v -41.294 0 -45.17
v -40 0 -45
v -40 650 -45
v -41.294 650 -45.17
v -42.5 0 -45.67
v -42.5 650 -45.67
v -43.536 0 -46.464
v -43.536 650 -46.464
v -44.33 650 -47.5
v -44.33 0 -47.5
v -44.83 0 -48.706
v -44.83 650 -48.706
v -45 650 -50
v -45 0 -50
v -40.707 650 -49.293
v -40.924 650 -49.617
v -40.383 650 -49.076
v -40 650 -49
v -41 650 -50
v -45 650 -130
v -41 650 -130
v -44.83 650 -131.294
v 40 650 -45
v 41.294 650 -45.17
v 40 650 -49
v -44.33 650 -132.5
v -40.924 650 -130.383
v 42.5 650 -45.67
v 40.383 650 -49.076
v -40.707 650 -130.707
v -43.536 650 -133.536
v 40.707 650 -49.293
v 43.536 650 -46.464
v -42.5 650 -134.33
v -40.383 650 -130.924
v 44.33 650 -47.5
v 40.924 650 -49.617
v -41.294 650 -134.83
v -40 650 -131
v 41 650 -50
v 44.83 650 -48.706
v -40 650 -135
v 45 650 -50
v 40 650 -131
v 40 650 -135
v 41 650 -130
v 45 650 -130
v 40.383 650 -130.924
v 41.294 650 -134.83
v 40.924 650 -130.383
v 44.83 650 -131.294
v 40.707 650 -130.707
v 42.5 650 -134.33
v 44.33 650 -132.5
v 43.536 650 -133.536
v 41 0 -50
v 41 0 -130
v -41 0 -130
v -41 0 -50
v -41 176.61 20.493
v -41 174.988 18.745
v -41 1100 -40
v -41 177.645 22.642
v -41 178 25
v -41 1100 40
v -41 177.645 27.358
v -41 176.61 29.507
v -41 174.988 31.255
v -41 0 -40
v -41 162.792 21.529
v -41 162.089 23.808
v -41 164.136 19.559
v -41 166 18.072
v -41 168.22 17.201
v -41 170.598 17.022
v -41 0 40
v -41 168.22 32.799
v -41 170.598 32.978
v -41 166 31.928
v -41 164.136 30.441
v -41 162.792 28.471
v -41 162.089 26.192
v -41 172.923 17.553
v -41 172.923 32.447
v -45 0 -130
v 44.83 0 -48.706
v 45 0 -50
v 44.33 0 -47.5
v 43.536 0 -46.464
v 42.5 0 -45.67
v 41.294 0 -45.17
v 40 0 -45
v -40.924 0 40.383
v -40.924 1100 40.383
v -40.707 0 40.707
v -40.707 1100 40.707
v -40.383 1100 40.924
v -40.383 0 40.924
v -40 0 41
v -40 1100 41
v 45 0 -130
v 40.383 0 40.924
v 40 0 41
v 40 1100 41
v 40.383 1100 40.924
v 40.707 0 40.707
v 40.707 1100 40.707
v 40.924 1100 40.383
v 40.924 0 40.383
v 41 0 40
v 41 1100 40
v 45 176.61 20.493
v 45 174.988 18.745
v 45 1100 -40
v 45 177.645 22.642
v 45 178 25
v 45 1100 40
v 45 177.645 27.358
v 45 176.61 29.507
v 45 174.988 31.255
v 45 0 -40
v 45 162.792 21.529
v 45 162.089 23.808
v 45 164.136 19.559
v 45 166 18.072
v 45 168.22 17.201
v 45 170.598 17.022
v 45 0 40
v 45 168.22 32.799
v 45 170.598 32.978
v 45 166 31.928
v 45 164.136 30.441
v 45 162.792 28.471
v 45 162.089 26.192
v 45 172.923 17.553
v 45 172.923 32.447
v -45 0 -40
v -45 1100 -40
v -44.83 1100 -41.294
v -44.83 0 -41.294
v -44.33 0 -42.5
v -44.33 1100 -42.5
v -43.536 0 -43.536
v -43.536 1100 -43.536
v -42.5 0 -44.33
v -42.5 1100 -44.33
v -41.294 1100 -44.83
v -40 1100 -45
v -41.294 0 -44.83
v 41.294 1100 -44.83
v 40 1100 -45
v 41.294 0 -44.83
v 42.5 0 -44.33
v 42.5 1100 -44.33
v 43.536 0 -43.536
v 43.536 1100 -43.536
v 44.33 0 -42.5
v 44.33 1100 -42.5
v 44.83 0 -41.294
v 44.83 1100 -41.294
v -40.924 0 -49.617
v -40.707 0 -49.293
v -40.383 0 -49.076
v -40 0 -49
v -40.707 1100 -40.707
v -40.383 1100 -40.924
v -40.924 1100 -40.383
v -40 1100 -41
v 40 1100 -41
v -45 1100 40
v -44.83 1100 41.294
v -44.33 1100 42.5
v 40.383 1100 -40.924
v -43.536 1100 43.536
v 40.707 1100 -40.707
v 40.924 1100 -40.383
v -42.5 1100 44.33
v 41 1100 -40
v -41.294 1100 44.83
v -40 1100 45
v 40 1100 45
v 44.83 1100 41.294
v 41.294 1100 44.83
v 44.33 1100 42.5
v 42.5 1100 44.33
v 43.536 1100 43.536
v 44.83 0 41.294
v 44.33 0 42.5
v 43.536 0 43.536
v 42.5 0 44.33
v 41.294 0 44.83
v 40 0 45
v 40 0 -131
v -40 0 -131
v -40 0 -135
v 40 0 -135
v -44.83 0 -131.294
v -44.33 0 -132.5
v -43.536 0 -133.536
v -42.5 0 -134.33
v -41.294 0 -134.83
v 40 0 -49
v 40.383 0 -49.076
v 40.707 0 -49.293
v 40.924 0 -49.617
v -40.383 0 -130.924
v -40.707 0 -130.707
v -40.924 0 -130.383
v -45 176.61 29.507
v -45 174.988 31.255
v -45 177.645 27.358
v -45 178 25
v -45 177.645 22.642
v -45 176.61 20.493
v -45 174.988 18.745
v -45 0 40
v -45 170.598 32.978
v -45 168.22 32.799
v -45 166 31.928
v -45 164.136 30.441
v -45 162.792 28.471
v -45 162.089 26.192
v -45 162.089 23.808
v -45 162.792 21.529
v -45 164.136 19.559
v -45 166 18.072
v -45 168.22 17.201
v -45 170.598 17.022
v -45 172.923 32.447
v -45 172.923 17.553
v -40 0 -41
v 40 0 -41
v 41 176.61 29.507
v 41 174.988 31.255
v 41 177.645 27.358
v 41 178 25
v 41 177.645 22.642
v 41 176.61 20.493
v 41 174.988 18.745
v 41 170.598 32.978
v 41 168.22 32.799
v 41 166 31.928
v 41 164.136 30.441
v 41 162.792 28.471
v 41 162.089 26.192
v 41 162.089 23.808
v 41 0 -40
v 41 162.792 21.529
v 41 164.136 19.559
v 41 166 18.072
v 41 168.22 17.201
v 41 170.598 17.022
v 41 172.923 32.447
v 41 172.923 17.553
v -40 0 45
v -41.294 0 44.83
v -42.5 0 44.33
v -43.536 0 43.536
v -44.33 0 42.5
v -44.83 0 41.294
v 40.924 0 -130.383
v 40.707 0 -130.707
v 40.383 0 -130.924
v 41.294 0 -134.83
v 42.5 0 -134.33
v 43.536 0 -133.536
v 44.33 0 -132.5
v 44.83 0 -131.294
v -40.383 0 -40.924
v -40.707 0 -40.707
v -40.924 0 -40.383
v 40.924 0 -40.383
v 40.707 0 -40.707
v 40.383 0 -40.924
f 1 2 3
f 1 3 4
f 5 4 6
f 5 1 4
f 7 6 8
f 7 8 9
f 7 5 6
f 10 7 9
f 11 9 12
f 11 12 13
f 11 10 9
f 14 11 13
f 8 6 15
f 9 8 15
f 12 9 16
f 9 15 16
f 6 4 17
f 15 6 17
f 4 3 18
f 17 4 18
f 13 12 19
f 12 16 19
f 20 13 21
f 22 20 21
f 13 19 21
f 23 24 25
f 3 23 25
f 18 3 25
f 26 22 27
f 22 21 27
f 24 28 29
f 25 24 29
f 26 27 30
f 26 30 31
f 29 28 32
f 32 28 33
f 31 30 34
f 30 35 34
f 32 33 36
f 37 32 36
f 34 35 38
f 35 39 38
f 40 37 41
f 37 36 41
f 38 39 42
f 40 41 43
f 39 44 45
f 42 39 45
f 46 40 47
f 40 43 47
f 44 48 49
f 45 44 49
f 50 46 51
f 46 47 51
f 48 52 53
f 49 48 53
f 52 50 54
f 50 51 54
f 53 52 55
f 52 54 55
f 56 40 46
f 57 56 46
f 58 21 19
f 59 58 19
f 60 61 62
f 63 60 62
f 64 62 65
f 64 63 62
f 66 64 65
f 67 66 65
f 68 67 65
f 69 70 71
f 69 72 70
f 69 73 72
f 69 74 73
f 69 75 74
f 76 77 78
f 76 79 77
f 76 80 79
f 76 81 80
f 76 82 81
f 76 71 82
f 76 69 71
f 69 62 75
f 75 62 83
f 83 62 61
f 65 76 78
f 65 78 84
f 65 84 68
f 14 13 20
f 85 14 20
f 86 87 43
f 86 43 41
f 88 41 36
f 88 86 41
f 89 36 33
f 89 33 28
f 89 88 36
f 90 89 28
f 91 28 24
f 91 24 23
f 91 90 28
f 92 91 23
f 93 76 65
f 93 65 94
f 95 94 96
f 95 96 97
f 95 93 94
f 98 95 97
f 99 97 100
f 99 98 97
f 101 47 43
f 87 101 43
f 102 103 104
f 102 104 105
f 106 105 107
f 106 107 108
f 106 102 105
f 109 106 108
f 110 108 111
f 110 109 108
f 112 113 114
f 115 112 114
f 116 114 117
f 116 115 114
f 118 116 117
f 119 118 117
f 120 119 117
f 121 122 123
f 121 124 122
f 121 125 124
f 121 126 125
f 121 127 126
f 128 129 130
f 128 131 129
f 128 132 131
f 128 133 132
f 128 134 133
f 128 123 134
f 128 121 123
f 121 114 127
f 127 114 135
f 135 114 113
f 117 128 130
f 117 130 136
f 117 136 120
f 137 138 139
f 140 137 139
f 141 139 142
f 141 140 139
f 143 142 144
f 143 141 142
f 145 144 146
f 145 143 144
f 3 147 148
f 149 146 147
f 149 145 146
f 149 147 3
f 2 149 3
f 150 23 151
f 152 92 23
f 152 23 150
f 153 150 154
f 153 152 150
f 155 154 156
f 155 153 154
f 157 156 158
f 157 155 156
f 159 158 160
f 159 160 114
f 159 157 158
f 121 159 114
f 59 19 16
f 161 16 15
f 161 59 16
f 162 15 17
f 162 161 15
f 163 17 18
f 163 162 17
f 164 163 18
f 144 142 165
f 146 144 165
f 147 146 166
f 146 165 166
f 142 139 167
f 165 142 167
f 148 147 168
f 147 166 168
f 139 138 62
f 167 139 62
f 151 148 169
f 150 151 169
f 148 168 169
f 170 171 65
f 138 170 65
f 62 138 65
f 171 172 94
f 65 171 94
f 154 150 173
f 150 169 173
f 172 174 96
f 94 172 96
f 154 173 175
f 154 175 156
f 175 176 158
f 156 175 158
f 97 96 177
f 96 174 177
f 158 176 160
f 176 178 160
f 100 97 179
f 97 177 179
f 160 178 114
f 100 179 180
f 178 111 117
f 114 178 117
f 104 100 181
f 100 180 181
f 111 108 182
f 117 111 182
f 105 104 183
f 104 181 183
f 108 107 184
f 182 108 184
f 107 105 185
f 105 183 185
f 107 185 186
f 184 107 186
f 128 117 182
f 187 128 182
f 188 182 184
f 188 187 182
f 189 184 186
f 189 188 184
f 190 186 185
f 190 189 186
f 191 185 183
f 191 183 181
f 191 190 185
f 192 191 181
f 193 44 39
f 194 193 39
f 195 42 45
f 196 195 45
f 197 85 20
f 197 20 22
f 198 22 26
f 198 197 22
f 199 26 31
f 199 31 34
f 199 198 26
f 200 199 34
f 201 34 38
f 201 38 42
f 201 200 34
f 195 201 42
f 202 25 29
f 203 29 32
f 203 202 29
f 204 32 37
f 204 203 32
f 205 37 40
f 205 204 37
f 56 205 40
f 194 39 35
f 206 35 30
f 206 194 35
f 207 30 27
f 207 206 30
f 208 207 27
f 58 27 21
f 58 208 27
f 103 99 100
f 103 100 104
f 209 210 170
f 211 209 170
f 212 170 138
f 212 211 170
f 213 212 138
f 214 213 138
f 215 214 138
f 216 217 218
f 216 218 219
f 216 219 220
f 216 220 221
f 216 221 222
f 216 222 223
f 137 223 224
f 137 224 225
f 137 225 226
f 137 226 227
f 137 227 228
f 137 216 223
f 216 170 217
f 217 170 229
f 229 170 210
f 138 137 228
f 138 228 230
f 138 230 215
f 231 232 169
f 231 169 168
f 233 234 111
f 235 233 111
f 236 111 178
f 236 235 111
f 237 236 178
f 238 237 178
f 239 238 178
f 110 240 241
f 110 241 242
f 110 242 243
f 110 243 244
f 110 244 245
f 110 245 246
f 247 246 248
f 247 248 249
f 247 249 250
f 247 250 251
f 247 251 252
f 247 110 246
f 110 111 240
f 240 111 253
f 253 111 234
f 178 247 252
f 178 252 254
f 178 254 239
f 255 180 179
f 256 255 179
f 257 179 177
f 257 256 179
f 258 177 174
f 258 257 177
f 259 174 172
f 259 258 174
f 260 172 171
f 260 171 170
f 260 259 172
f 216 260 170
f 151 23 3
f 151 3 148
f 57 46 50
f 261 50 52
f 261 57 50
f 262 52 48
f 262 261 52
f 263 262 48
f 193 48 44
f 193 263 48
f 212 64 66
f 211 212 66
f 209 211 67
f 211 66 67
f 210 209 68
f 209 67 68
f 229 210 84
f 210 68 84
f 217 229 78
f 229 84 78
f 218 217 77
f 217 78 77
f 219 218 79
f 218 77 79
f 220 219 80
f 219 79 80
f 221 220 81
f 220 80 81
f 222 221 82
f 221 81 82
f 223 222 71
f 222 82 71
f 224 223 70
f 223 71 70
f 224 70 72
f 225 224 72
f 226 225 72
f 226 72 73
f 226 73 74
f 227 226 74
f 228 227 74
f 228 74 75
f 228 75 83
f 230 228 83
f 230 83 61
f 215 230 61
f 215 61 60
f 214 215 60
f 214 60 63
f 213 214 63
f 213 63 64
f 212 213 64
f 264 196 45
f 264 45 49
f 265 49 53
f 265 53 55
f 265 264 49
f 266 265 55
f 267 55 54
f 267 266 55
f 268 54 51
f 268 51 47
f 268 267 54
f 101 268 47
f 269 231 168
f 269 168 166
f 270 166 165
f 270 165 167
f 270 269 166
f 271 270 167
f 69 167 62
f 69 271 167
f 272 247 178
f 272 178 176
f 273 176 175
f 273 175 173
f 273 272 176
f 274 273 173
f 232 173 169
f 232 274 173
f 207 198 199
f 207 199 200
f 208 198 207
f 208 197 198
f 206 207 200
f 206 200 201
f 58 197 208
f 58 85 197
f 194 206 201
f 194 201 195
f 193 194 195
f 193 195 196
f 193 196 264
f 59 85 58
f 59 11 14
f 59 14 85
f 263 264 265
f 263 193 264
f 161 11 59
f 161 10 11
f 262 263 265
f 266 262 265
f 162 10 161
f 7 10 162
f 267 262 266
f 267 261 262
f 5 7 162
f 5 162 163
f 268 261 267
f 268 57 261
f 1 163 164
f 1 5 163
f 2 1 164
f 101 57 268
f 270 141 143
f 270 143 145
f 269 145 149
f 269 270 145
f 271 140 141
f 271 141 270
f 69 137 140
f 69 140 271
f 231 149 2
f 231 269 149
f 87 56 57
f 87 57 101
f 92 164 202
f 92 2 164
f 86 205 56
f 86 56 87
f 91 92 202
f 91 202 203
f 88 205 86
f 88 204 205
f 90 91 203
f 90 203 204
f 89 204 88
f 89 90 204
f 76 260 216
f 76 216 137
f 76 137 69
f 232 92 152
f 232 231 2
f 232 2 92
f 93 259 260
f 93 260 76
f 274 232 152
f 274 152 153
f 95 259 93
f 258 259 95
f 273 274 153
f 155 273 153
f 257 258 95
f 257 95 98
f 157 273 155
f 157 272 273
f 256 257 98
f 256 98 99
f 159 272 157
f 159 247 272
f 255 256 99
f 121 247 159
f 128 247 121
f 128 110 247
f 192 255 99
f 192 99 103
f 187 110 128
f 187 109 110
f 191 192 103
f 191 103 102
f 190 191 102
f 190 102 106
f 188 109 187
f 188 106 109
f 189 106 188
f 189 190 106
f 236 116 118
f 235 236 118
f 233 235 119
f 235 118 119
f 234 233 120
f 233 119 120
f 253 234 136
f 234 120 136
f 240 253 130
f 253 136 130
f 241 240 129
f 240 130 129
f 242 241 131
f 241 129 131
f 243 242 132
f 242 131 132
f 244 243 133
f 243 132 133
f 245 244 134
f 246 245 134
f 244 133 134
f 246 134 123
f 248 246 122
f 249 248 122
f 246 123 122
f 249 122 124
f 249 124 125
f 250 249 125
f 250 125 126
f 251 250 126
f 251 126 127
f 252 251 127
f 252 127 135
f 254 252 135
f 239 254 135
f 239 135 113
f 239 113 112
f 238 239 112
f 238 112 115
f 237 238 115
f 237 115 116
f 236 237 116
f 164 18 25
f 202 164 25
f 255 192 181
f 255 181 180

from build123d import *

# Parameters (mm, degrees)
F1_DEPTH = 1100
F2_R     = 8
F3_DEPTH = 90.001
F4_W     = 450
F4_H     = 80
F4_H_2   = 5
F5_DEPTH = 90.001


with BuildPart() as f1:
    # F0 (on Front) → F1 (new body)
    with BuildSketch(Plane.XZ):
        with BuildLine():
            ThreePointArc((45, 40), (43.5355339059, 43.5355339059), (40, 45))
            Line((40, 45), (-40, 45))
            ThreePointArc((-40, 45), (-43.5355339059, 43.5355339059), (-45, 40))
            Line((-45, 40), (-45, -40))
            ThreePointArc((-45, -40), (-43.5355339059, -43.5355339059), (-40, -45))
            Line((-40, -45), (40, -45))
            ThreePointArc((40, -45), (43.5355339059, -43.5355339059), (45, -40))
            Line((45, -40), (45, 40))
        make_face()
        with BuildLine():
            ThreePointArc((-41, 40), (-40.7071067812, 40.7071067812), (-40, 41))
            Line((-40, 41), (40, 41))
            ThreePointArc((40, 41), (40.7071067812, 40.7071067812), (41, 40))
            Line((41, 40), (41, -40))
            ThreePointArc((41, -40), (40.7071067812, -40.7071067812), (40, -41))
            Line((40, -41), (-40, -41))
            ThreePointArc((-40, -41), (-40.7071067812, -40.7071067812), (-41, -40))
            Line((-41, -40), (-41, 40))
        make_face(mode=Mode.SUBTRACT)
        with BuildLine():
            ThreePointArc((45, -50), (43.5355339059, -46.4644660941), (40, -45))
            Line((40, -45), (-40, -45))
            ThreePointArc((-40, -45), (-43.5355339059, -46.4644660941), (-45, -50))
            Line((-45, -50), (-45, -130))
            ThreePointArc((-45, -130), (-43.5355339059, -133.5355339059), (-40, -135))
            Line((-40, -135), (40, -135))
            ThreePointArc((40, -135), (43.5355339059, -133.5355339059), (45, -130))
            Line((45, -130), (45, -50))
        make_face()
        with BuildLine():
            ThreePointArc((-41, -50), (-40.7071067812, -49.2928932188), (-40, -49))
            Line((-40, -49), (40, -49))
            ThreePointArc((40, -49), (40.7071067812, -49.2928932188), (41, -50))
            Line((41, -50), (41, -130))
            ThreePointArc((41, -130), (40.7071067812, -130.7071067812), (40, -131))
            Line((40, -131), (-40, -131))
            ThreePointArc((-40, -131), (-40.7071067812, -130.7071067812), (-41, -130))
            Line((-41, -130), (-41, -50))
        make_face(mode=Mode.SUBTRACT)
    extrude(amount=-F1_DEPTH)

    # F2 (on face) → F3 (cut, through all)
    with BuildSketch(Plane.YZ.offset(45)):
        with Locations((170, 25)):
            Circle(F2_R)
    extrude(amount=-F3_DEPTH, mode=Mode.SUBTRACT)

    # F4 (on face) → F5 (cut, through all)
    with BuildSketch(Plane.YZ.offset(45)):
        with Locations((875, -90)):
            Rectangle(F4_W, F4_H)
        with Locations((875, -132.5)):
            Rectangle(F4_W, F4_H_2)
        with Locations((875, -47.5)):
            Rectangle(F4_W, F4_H_2)
    extrude(amount=-F5_DEPTH, mode=Mode.SUBTRACT)


solid = f1.part
